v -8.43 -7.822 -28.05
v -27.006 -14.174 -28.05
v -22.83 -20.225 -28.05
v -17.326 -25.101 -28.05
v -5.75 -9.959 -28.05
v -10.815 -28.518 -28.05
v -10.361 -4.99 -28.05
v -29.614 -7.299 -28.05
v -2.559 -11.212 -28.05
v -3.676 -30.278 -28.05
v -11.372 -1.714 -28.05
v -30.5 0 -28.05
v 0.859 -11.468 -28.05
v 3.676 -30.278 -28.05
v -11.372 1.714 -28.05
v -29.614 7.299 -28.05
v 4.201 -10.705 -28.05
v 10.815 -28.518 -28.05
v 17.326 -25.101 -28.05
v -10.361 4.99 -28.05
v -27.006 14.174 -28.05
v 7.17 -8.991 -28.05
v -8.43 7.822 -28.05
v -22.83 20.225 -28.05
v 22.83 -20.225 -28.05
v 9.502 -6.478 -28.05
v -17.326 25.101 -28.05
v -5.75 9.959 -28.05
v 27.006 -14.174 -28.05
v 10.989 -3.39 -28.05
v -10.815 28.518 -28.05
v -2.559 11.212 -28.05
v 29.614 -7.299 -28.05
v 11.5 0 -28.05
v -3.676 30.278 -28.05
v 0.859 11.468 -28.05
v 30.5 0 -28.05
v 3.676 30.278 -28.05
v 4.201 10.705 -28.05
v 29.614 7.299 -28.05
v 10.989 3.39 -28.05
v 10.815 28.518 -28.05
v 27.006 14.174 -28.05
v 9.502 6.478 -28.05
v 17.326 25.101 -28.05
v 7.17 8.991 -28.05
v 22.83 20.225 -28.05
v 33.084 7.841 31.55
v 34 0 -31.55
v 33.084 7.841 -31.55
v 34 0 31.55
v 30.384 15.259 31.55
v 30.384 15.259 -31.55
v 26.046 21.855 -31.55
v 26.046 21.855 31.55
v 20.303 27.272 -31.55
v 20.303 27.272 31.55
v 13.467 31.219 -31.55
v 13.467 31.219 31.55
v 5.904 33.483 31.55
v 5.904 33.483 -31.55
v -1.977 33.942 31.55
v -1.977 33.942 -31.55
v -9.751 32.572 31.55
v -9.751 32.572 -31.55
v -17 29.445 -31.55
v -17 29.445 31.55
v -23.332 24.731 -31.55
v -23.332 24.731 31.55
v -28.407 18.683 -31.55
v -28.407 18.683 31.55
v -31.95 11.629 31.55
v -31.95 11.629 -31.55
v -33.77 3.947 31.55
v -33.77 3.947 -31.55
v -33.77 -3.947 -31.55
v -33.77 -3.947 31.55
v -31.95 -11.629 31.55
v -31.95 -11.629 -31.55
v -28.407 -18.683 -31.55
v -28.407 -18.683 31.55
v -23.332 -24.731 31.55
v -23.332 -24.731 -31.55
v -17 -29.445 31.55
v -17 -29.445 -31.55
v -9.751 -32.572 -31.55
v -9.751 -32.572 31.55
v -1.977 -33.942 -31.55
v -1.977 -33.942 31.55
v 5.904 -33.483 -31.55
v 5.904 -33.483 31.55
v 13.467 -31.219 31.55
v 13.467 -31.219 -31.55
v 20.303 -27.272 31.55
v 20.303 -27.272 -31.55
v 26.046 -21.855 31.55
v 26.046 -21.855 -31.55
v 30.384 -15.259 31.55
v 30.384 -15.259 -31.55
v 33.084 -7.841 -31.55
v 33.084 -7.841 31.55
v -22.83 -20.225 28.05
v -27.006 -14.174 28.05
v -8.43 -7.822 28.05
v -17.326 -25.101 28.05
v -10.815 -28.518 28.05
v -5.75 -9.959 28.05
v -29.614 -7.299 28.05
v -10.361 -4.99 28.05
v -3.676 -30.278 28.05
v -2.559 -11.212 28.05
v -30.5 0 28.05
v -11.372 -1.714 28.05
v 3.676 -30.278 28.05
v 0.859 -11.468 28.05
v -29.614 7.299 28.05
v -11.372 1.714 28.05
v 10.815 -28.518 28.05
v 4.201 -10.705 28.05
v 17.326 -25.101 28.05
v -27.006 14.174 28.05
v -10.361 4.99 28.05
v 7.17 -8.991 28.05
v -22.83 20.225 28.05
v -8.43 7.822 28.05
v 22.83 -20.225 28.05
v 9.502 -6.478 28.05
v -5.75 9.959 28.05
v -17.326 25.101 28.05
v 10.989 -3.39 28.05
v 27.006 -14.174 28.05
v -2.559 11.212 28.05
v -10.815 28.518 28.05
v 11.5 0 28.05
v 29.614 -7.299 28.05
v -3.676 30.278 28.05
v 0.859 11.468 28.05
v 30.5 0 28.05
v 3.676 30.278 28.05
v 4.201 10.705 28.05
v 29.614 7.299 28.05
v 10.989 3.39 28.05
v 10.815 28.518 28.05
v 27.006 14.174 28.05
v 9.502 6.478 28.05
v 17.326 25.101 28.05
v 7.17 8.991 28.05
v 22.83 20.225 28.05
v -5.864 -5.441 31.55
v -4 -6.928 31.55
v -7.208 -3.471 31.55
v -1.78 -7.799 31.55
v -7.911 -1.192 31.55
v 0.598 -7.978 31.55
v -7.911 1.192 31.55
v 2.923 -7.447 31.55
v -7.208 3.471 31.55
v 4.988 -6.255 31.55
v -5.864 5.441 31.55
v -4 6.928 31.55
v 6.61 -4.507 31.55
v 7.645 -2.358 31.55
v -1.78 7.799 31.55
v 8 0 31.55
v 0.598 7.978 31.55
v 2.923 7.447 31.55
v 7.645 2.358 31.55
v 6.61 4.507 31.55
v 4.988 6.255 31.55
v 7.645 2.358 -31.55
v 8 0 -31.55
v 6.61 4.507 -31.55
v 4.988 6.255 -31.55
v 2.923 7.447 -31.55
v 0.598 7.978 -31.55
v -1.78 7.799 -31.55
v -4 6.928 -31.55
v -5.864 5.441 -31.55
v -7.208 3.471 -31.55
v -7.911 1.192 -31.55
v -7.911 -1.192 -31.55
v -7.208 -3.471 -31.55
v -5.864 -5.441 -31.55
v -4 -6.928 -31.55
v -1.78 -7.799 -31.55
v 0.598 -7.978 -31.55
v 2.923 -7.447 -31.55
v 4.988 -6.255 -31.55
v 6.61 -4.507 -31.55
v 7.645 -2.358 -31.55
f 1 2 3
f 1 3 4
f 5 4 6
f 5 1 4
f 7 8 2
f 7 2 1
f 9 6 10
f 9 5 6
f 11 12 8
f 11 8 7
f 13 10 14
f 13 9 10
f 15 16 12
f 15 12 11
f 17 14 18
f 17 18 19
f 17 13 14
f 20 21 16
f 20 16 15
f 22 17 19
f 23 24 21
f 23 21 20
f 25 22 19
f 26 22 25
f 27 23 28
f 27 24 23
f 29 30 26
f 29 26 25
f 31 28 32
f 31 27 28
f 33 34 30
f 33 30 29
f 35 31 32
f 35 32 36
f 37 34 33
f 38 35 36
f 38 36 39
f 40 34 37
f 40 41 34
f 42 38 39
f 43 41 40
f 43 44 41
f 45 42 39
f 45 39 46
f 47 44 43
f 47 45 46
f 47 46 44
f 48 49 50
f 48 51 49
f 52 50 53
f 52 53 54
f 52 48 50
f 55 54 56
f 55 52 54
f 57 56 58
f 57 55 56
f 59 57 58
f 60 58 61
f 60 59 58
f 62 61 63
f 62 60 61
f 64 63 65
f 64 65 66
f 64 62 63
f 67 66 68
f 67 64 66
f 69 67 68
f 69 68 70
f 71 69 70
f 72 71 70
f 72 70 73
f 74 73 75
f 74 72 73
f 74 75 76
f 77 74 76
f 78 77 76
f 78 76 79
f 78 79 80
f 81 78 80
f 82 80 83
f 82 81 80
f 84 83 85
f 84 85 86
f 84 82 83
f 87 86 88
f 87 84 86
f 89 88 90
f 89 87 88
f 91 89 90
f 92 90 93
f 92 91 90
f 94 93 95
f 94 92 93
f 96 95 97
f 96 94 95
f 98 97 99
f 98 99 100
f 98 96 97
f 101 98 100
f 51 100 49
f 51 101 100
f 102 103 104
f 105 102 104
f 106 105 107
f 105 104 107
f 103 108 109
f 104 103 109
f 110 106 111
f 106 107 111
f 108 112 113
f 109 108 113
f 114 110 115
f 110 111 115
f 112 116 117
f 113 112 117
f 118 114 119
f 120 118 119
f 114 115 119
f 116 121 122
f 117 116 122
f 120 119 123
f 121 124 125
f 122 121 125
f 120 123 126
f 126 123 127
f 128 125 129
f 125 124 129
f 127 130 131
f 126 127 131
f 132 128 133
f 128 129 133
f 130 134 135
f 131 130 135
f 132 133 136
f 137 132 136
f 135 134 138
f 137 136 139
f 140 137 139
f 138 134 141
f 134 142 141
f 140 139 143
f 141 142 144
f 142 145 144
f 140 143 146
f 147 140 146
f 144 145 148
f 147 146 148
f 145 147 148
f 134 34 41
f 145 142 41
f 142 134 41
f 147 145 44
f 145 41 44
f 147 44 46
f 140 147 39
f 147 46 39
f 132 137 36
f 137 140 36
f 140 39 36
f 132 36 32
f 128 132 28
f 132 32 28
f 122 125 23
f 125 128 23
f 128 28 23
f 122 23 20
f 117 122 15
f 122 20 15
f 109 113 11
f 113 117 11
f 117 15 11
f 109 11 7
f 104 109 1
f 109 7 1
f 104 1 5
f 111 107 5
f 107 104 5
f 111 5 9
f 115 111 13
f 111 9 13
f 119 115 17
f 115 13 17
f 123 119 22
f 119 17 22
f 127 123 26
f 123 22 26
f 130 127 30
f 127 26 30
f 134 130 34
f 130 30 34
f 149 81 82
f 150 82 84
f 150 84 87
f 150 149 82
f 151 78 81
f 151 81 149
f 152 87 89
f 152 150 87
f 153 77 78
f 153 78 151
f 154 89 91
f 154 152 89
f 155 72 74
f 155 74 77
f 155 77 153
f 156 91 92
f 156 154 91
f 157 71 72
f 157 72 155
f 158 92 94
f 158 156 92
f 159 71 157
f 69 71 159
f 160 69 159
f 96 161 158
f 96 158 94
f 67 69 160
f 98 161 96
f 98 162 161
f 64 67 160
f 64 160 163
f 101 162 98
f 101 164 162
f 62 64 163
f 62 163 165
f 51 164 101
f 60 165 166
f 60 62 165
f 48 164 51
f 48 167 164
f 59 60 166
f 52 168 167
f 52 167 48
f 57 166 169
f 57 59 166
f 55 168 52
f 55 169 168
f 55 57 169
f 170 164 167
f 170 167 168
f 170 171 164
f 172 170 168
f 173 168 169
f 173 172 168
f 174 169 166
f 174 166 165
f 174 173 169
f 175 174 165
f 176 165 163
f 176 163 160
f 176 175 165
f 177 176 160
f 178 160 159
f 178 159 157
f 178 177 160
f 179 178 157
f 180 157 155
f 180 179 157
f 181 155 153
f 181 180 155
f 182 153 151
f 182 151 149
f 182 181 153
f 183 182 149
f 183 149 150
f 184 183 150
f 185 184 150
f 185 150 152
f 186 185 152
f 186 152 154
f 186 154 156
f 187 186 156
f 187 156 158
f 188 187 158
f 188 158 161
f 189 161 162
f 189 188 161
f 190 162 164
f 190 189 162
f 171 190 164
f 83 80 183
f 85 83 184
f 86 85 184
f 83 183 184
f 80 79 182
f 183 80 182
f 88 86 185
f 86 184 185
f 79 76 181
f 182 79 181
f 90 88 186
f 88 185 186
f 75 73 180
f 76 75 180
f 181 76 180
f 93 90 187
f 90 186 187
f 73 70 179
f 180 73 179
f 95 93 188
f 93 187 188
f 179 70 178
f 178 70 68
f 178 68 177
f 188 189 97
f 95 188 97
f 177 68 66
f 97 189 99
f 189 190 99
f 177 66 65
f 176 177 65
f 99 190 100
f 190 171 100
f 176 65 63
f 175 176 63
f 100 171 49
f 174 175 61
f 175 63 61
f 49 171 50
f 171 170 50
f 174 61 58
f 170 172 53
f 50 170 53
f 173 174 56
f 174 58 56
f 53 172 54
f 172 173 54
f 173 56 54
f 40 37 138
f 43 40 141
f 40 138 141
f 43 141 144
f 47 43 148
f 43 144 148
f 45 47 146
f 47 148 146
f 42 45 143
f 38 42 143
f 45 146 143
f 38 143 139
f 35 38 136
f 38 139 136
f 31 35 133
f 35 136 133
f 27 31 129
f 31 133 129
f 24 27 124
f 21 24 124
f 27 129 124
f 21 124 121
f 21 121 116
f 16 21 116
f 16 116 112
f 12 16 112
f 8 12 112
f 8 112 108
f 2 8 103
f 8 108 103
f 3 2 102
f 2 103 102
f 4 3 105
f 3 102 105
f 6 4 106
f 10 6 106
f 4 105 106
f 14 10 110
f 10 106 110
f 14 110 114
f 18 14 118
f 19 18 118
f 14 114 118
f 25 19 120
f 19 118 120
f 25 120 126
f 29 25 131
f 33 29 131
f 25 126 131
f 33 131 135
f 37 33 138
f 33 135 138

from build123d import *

# Parameters (mm, degrees)
SKETCH1_R           = 34
SKETCH1_R_2         = 8
BOSS_EXTRUDE1_DEPTH = 31.55
SHELL1_T            = 3.5


with BuildPart() as part:
    # Sketch1 → Boss-Extrude1 (new, symmetric)
    with BuildSketch(Plane.XY):
        Circle(SKETCH1_R)
        Circle(SKETCH1_R_2, mode=Mode.SUBTRACT)
    extrude(amount=BOSS_EXTRUDE1_DEPTH, both=True)

    # Shell1 (no face opened: a closed hollow body)
    add(offset(amount=-SHELL1_T, mode=Mode.PRIVATE), mode=Mode.SUBTRACT)


solid = part.part
